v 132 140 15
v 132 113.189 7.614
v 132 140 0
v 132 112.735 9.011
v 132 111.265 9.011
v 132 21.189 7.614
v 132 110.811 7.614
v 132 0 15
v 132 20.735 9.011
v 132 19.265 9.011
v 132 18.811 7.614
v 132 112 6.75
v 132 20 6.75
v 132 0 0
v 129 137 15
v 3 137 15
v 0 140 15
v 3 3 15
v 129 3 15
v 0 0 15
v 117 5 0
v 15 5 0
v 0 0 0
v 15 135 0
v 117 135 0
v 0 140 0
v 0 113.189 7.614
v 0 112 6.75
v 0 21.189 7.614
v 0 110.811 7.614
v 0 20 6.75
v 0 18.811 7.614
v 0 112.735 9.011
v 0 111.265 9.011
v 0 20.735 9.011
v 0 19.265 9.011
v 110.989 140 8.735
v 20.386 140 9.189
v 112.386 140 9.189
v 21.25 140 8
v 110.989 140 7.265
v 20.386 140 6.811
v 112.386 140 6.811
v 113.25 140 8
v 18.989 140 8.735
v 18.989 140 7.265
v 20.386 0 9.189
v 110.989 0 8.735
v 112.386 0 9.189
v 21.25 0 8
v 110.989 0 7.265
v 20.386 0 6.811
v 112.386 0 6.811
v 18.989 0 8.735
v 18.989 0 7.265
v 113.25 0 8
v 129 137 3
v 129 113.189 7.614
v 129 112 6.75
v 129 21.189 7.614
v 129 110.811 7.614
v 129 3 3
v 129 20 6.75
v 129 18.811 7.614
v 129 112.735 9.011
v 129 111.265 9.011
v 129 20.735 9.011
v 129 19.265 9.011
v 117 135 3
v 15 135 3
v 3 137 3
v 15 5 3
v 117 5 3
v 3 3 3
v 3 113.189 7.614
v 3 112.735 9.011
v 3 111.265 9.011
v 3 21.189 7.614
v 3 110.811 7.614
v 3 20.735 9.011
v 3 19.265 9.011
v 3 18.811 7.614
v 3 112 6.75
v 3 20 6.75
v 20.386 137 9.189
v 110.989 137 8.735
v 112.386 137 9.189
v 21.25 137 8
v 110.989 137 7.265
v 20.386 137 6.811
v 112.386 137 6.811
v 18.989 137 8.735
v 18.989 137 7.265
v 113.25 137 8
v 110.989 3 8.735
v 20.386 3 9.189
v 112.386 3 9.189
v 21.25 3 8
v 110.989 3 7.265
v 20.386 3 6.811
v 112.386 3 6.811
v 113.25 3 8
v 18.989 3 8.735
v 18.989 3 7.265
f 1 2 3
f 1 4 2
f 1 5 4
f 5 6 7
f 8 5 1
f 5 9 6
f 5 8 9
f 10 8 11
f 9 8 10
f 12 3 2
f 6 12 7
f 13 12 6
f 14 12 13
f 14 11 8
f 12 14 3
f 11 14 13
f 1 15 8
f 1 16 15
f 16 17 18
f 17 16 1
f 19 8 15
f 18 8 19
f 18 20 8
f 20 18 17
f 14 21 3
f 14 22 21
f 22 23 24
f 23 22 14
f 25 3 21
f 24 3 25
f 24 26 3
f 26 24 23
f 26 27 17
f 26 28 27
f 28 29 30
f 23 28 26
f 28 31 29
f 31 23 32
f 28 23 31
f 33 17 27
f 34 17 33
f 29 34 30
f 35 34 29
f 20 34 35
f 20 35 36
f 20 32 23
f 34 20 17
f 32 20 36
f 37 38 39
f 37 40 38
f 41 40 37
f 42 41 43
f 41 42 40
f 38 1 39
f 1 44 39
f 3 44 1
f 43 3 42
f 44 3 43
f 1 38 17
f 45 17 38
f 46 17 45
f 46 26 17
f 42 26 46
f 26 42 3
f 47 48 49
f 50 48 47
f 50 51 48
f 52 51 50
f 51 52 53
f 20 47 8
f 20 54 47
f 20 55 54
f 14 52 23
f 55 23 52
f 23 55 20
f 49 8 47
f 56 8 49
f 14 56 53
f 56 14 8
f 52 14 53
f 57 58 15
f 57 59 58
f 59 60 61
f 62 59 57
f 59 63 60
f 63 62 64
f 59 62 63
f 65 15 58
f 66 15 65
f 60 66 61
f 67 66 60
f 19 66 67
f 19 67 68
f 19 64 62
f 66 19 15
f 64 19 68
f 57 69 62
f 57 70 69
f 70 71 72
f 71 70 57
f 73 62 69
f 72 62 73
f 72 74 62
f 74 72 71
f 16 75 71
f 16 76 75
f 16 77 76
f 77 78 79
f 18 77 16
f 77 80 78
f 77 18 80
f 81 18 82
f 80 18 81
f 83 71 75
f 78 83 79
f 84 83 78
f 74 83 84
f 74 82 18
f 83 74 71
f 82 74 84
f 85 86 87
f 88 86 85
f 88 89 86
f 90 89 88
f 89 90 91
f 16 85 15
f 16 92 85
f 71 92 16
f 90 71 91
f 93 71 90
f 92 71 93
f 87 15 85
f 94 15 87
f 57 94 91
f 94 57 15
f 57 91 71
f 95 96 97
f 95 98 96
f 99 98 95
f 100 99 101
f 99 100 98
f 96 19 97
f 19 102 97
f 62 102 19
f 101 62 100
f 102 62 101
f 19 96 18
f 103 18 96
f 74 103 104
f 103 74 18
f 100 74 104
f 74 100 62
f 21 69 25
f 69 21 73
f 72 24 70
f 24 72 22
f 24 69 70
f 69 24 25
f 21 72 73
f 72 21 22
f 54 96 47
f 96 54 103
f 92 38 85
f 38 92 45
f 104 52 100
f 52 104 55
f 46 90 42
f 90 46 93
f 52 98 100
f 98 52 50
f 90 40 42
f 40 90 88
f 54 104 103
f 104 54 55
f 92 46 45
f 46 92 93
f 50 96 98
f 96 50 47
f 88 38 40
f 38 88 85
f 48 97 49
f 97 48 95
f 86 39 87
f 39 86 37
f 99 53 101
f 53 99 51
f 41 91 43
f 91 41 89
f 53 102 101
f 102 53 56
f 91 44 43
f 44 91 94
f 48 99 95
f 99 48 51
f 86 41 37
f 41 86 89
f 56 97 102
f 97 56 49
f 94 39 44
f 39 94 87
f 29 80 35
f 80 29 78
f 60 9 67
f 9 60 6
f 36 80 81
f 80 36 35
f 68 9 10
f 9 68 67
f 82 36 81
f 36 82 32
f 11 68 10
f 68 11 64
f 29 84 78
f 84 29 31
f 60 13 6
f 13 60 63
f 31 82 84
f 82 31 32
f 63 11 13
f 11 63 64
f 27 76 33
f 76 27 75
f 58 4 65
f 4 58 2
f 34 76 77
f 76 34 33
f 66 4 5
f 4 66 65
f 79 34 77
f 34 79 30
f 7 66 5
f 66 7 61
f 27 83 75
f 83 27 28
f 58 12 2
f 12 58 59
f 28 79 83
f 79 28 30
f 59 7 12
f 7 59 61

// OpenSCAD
difference(){
cube([132,140,15]);
translate([3,3,3])cube([126,134,17]);
translate([15,5,-1])cube([102,130,17]);
translate([20,0,8])
rotate([-90,0,0])cylinder(d=2.5,h=200);
translate([112,0,8])
rotate([-90,0,0])cylinder(d=2.5,h=200);
translate([0,20,8])
rotate([0,90,0])cylinder(d=2.5,h=200);
translate([0,112,8])
rotate([0,90,0])cylinder(d=2.5,h=200);
}
